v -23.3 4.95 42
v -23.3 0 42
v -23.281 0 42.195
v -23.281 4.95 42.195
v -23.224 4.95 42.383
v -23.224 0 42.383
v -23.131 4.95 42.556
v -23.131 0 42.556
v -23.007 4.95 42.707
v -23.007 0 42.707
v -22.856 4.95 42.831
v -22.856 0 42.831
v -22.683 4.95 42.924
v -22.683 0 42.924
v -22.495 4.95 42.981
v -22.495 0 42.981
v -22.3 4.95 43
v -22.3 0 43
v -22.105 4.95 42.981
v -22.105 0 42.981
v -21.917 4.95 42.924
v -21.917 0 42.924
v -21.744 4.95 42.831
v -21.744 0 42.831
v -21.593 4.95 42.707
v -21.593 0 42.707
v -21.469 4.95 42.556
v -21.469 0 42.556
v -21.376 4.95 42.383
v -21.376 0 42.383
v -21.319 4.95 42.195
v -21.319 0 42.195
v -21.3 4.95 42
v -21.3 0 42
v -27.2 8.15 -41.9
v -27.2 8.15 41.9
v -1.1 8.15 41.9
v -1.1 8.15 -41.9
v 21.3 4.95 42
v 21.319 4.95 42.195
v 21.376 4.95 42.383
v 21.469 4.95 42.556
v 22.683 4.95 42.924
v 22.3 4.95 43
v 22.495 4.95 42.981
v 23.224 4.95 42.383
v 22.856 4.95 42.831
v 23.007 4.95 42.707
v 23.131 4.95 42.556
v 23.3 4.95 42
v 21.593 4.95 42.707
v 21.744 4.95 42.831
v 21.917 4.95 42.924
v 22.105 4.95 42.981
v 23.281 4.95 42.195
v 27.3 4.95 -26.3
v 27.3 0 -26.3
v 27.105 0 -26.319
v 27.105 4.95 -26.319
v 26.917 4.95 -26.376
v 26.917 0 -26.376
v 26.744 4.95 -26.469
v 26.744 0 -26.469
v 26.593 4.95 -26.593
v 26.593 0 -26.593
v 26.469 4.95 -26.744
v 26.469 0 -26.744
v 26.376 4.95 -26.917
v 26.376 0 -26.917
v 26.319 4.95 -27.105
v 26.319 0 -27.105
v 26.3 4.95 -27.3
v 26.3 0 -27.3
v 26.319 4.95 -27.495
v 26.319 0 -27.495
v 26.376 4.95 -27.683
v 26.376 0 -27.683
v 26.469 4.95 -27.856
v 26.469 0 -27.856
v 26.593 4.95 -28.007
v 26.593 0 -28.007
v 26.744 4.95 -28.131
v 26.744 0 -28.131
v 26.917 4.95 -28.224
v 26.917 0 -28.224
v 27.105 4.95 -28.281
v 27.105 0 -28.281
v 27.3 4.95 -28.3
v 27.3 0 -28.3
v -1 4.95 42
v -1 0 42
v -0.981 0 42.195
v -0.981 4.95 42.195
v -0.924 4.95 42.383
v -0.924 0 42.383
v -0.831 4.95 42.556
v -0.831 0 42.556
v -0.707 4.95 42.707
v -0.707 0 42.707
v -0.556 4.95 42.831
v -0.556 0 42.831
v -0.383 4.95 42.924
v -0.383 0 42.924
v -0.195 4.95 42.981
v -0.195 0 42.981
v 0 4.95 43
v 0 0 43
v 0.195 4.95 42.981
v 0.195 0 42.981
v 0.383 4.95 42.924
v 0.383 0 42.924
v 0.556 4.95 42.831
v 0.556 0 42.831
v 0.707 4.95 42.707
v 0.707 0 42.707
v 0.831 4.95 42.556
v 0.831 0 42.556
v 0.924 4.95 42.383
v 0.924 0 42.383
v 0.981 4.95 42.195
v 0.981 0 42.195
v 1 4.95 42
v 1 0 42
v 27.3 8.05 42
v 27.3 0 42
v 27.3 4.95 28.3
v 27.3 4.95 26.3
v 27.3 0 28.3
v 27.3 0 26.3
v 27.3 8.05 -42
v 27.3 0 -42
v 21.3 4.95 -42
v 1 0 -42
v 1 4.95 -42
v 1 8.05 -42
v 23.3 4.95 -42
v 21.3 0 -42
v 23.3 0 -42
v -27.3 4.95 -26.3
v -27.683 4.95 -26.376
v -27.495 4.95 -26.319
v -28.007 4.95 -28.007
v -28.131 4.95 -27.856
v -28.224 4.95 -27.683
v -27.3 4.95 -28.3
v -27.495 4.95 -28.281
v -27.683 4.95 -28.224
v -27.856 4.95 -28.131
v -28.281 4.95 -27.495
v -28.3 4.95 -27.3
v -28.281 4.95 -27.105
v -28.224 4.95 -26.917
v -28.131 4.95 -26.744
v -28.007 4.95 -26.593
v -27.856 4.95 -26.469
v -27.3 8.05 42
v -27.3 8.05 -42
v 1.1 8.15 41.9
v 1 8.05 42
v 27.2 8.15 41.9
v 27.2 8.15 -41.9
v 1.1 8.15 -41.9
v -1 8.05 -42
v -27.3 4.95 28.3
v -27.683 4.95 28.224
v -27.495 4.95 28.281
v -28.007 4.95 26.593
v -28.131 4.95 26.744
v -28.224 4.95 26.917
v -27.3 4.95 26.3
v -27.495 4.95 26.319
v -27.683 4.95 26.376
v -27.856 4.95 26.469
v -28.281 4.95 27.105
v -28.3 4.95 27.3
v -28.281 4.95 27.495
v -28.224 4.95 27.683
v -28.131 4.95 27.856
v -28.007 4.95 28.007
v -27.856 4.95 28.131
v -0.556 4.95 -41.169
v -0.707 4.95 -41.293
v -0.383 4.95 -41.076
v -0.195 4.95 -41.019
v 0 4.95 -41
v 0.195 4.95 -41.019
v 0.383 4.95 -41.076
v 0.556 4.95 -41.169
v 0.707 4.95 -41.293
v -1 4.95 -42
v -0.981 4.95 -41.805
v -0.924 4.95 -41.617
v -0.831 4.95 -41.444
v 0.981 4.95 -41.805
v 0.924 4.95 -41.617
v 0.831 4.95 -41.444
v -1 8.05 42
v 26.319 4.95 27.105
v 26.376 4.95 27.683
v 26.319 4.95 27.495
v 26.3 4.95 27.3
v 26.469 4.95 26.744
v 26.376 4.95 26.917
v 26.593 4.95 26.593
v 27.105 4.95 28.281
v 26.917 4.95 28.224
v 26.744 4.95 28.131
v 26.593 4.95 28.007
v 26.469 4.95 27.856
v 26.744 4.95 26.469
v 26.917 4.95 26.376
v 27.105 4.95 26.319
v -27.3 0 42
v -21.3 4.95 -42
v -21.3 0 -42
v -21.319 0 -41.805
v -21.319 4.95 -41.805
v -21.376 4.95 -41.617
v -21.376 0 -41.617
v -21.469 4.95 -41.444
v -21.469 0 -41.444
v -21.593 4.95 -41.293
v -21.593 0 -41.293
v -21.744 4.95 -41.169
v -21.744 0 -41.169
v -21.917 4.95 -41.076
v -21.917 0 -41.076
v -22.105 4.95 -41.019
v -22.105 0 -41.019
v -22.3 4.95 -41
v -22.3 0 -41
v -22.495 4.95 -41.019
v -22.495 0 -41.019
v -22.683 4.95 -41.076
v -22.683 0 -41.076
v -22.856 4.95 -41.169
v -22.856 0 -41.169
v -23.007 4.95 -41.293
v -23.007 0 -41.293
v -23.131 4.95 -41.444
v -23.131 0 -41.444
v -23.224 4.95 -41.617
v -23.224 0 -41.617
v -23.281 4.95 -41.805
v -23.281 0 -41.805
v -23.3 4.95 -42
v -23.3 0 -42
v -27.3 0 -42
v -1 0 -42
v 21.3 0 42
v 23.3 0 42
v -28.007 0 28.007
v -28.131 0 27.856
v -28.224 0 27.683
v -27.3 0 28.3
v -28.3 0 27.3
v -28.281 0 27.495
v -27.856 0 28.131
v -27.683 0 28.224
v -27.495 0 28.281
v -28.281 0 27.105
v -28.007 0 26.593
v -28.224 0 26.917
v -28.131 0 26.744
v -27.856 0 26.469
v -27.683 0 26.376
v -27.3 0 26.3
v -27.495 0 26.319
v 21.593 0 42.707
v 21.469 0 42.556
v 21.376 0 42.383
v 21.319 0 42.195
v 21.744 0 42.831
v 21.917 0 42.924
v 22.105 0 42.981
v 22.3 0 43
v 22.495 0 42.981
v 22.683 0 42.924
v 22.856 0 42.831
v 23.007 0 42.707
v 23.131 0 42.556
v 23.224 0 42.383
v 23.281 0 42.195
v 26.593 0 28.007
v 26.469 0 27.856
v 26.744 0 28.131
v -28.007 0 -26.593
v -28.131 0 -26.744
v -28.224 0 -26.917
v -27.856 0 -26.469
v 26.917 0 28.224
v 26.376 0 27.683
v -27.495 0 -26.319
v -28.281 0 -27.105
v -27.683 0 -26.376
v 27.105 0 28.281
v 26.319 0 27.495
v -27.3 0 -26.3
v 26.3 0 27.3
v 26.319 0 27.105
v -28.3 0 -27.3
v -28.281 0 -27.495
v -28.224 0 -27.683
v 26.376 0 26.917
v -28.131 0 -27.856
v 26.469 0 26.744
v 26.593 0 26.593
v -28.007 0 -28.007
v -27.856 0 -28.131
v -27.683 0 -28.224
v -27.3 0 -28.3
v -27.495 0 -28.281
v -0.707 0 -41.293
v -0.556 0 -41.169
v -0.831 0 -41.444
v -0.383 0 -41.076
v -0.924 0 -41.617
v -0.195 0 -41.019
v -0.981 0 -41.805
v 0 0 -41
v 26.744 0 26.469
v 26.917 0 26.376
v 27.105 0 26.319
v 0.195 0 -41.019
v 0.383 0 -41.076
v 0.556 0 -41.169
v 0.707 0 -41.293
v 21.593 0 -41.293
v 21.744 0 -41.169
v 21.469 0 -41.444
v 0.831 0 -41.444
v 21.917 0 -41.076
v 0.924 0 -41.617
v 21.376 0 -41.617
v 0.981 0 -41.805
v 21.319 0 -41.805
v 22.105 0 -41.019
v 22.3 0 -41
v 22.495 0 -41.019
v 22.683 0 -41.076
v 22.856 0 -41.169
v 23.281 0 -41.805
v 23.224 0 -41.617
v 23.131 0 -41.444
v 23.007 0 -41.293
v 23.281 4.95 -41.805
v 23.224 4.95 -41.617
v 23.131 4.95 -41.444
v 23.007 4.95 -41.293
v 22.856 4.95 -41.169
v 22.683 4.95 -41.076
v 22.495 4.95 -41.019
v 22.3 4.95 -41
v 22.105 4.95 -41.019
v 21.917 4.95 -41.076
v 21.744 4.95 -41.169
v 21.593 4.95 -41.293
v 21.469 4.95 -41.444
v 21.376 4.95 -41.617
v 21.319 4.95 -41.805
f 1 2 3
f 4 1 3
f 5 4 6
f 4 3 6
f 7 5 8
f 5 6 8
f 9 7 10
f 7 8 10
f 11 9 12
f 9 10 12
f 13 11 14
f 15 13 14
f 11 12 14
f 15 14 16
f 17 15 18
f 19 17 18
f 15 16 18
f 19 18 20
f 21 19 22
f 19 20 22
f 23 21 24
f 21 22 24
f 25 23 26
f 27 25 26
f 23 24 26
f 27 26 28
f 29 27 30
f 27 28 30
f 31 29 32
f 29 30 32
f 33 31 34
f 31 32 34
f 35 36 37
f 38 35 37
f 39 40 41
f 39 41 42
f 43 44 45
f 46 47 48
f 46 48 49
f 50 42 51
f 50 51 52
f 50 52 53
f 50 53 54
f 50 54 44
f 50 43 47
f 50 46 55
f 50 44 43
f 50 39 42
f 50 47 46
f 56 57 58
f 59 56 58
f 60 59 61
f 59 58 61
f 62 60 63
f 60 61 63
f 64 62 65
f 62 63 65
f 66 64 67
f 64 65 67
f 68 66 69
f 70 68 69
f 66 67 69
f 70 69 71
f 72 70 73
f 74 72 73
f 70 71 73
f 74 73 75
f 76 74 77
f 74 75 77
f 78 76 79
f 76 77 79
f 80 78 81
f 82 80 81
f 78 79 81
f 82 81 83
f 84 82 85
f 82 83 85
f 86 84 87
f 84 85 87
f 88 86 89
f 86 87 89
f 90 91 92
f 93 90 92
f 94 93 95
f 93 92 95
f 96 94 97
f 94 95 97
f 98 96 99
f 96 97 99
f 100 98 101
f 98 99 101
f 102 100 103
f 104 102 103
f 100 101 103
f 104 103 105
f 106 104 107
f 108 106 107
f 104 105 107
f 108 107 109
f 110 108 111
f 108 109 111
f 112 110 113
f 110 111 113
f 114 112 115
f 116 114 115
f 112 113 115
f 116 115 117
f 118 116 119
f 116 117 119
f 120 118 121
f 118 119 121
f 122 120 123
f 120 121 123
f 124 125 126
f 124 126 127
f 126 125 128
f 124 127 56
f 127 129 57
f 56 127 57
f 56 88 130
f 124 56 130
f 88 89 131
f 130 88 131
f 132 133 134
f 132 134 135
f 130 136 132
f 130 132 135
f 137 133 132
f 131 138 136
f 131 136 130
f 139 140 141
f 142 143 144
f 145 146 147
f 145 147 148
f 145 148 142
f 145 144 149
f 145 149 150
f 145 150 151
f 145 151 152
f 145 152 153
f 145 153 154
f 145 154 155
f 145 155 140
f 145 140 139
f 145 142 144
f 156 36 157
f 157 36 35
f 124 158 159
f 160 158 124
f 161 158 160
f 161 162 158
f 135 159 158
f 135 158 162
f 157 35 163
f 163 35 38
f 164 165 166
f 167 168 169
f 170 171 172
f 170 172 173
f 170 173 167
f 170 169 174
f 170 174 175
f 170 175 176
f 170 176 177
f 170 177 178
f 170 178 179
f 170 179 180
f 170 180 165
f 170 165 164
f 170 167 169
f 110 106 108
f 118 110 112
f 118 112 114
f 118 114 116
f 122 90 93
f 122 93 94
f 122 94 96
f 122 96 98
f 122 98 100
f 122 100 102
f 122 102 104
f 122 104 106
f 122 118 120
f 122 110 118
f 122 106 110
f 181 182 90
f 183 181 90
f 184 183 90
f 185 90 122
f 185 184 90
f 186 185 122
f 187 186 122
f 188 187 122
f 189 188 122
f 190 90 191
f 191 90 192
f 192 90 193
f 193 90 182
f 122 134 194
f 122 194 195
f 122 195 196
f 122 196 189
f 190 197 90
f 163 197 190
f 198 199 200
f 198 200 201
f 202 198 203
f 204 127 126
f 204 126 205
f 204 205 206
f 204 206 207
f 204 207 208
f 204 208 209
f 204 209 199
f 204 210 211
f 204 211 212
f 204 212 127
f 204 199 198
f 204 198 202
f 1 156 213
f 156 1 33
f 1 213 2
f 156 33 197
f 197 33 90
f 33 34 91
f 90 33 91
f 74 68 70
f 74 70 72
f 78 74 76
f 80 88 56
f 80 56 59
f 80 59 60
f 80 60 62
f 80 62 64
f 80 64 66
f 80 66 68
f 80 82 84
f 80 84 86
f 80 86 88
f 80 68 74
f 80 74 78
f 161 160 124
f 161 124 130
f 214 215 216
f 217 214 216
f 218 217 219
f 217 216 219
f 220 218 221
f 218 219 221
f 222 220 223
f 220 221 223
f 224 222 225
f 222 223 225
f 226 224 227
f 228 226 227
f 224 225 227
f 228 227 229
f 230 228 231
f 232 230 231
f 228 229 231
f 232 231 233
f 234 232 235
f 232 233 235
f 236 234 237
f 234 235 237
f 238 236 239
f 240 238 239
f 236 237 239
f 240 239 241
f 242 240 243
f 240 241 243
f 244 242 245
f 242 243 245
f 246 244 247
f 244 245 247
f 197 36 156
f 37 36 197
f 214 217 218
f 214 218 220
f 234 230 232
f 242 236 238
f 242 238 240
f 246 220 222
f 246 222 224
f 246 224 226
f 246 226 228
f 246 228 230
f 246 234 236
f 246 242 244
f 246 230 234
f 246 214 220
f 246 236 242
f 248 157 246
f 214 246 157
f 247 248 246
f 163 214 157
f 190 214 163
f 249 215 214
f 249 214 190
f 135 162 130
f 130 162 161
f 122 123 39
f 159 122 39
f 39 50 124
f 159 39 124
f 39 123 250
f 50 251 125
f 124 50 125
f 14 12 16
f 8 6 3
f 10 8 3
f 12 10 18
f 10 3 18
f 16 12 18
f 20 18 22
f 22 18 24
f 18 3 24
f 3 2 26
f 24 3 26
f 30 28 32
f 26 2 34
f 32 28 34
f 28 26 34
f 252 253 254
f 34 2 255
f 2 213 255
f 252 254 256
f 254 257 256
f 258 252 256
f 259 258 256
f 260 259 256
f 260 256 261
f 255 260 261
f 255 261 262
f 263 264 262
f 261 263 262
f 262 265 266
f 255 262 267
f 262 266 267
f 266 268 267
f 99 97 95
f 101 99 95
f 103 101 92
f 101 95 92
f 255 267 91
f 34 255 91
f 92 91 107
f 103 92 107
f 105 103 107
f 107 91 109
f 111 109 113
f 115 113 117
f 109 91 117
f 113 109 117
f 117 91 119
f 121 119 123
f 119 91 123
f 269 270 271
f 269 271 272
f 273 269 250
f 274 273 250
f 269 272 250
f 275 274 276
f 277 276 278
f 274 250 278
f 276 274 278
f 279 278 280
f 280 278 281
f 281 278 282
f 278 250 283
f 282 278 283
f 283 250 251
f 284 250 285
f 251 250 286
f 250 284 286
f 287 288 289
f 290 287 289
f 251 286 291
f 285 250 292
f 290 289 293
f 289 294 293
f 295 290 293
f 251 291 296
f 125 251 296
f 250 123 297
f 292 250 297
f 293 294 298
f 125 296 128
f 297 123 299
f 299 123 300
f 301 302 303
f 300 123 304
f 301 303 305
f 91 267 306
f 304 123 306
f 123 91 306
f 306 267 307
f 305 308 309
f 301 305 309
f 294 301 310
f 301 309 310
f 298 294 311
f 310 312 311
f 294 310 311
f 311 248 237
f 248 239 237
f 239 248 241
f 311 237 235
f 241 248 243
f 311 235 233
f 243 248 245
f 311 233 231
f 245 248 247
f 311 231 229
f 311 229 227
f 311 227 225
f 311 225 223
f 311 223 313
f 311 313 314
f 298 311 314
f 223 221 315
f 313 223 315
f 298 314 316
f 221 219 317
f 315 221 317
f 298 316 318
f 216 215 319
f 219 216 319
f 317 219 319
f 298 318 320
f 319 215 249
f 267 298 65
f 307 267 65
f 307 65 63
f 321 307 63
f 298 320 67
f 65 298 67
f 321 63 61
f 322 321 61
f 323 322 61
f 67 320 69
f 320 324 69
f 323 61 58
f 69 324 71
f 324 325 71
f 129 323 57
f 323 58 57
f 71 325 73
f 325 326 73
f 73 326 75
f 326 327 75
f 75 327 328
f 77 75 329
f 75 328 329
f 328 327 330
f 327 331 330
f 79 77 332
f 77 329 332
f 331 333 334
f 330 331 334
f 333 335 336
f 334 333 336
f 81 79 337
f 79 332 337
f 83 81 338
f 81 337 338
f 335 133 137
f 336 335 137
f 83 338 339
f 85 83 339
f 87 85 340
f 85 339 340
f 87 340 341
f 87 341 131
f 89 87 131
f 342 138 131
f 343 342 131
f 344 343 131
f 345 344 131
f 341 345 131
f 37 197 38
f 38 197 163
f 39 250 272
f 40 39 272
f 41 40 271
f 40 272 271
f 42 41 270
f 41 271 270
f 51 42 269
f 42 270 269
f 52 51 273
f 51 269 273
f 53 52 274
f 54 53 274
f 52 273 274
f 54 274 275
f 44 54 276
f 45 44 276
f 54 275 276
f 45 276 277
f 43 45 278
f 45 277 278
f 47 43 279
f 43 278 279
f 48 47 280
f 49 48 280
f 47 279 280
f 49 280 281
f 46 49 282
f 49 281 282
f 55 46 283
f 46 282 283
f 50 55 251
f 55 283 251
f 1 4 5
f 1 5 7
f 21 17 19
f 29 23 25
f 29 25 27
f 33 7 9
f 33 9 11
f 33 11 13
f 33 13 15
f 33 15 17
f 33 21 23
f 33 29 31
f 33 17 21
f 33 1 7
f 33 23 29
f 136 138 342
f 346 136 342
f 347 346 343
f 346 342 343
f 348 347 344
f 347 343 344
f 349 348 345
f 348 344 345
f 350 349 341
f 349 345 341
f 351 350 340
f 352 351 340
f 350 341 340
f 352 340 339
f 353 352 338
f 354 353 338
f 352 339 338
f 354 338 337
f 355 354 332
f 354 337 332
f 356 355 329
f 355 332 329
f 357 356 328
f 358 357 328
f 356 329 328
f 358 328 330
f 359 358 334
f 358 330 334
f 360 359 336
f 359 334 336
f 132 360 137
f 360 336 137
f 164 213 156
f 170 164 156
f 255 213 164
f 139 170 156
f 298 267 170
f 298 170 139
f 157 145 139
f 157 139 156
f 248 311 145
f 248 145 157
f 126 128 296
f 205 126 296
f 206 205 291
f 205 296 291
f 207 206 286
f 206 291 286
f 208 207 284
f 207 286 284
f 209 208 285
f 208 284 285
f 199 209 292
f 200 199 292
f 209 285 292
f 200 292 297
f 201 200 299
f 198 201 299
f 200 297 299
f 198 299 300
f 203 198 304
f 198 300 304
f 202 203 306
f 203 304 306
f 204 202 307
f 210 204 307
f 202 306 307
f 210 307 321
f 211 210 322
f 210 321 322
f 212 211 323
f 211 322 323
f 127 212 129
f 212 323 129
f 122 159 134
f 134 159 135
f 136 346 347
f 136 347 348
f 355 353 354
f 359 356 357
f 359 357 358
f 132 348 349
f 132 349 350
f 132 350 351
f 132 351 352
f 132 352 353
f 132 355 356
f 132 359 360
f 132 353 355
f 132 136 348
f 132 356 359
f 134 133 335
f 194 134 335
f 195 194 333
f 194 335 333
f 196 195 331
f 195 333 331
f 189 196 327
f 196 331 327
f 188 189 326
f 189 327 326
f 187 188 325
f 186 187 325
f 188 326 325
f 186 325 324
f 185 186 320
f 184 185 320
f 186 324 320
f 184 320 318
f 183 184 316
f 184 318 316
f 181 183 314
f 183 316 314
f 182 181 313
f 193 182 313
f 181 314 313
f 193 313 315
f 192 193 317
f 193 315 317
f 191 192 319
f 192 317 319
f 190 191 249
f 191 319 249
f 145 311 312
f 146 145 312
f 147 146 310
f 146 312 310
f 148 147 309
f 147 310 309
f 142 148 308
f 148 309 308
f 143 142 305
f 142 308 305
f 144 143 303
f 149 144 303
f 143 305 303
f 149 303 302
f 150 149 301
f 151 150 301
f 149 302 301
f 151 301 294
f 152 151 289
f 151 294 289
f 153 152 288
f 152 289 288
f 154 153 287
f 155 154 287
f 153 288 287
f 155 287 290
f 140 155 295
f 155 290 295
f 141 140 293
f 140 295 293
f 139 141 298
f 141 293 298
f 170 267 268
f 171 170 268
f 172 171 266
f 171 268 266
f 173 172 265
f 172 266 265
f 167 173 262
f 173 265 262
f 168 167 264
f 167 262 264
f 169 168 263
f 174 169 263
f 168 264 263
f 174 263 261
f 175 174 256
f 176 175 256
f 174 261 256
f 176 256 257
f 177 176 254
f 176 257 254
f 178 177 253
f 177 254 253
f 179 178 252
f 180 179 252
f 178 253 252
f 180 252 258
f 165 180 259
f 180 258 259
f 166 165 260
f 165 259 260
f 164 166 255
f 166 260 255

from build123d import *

# Parameters (mm, degrees)
SKETCH1_W           = 54.6
SKETCH1_H           = 84
BOSS_EXTRUDE1_DEPTH = 8.15
SKETCH2_W           = 2
SKETCH2_H           = 84
CUT_EXTRUDE1_DEPTH  = 3.2
CHAMFER1_SIZE       = 0.1
BOSS_EXTRUDE2_DEPTH = 4.95
CUT_EXTRUDE4_DEPTH  = 4.95


with BuildPart() as part:
    # Sketch1 → Boss-Extrude1 (new body)
    with BuildSketch(Plane(origin=(0, 0, 0), x_dir=(1, 0, 0), z_dir=(0, 1, 0))):
        Rectangle(SKETCH1_W, SKETCH1_H)
    extrude(amount=BOSS_EXTRUDE1_DEPTH)

    # Sketch2 → Cut-Extrude1 (cut)
    with BuildSketch(Plane(origin=(0, 8.15, 0), x_dir=(1, 0, 0), z_dir=(0, 1, 0))):
        Rectangle(SKETCH2_W, SKETCH2_H)
    extrude(amount=-CUT_EXTRUDE1_DEPTH, mode=Mode.SUBTRACT)

    # Chamfer1
    chamfer1_edges = [part.edges().sort_by_distance(p)[0] for p in [
        (-27.3, 8.15, 0),
        (-14.15, 8.15, 42),
        (-14.15, 8.15, -42),
        (14.15, 8.15, 42),
        (1, 8.15, 0),
        (-1, 8.15, 0),
        (27.3, 8.15, 0),
        (14.15, 8.15, -42),
    ]]
    chamfer(chamfer1_edges, length=CHAMFER1_SIZE)

    # Sketch6 → Boss-Extrude2 (add)
    with BuildSketch(Plane(origin=(0, 0, 0), x_dir=(1, 0, 0), z_dir=(0, 1, 0))):
        with BuildLine():
            Line((-27.3, 26.3), (-27.3, 28.3))
            ThreePointArc((-27.3, 28.3), (-28.3, 27.3), (-27.3, 26.3))
        make_face()
        with BuildLine():
            Line((-21.3, -42), (-23.3, -42))
            ThreePointArc((-23.3, -42), (-22.3, -43), (-21.3, -42))
        make_face()
        with BuildLine():
            Line((-27.3, -28.3), (-27.3, -26.3))
            ThreePointArc((-27.3, -26.3), (-28.3, -27.3), (-27.3, -28.3))
        make_face()
        with BuildLine():
            Line((1, -42), (-1, -42))
            ThreePointArc((-1, -42), (0, -43), (1, -42))
        make_face()
        with BuildLine():
            Line((23.3, -42), (21.3, -42))
            ThreePointArc((21.3, -42), (22.3, -43), (23.3, -42))
        make_face()
    extrude(amount=BOSS_EXTRUDE2_DEPTH)

    # Sketch13 → Cut-Extrude4 (cut)
    with BuildSketch(Plane(origin=(0, 0, 0), x_dir=(1, 0, 0), z_dir=(0, 1, 0))):
        with BuildLine():
            Line((27.3, 28.3), (27.3, 26.3))
            ThreePointArc((27.3, 26.3), (26.3, 27.3), (27.3, 28.3))
        make_face()
        with BuildLine():
            Line((-23.3, 42), (-21.3, 42))
            ThreePointArc((-21.3, 42), (-22.3, 41), (-23.3, 42))
        make_face()
        with BuildLine():
            Line((27.3, -26.3), (27.3, -28.3))
            ThreePointArc((27.3, -28.3), (26.3, -27.3), (27.3, -26.3))
        make_face()
        with BuildLine():
            Line((-1, 42), (1, 42))
            ThreePointArc((1, 42), (0, 41), (-1, 42))
        make_face()
        with BuildLine():
            Line((21.3, 42), (23.3, 42))
            ThreePointArc((23.3, 42), (22.3, 41), (21.3, 42))
        make_face()
    extrude(amount=CUT_EXTRUDE4_DEPTH, mode=Mode.SUBTRACT)


solid = part.part
